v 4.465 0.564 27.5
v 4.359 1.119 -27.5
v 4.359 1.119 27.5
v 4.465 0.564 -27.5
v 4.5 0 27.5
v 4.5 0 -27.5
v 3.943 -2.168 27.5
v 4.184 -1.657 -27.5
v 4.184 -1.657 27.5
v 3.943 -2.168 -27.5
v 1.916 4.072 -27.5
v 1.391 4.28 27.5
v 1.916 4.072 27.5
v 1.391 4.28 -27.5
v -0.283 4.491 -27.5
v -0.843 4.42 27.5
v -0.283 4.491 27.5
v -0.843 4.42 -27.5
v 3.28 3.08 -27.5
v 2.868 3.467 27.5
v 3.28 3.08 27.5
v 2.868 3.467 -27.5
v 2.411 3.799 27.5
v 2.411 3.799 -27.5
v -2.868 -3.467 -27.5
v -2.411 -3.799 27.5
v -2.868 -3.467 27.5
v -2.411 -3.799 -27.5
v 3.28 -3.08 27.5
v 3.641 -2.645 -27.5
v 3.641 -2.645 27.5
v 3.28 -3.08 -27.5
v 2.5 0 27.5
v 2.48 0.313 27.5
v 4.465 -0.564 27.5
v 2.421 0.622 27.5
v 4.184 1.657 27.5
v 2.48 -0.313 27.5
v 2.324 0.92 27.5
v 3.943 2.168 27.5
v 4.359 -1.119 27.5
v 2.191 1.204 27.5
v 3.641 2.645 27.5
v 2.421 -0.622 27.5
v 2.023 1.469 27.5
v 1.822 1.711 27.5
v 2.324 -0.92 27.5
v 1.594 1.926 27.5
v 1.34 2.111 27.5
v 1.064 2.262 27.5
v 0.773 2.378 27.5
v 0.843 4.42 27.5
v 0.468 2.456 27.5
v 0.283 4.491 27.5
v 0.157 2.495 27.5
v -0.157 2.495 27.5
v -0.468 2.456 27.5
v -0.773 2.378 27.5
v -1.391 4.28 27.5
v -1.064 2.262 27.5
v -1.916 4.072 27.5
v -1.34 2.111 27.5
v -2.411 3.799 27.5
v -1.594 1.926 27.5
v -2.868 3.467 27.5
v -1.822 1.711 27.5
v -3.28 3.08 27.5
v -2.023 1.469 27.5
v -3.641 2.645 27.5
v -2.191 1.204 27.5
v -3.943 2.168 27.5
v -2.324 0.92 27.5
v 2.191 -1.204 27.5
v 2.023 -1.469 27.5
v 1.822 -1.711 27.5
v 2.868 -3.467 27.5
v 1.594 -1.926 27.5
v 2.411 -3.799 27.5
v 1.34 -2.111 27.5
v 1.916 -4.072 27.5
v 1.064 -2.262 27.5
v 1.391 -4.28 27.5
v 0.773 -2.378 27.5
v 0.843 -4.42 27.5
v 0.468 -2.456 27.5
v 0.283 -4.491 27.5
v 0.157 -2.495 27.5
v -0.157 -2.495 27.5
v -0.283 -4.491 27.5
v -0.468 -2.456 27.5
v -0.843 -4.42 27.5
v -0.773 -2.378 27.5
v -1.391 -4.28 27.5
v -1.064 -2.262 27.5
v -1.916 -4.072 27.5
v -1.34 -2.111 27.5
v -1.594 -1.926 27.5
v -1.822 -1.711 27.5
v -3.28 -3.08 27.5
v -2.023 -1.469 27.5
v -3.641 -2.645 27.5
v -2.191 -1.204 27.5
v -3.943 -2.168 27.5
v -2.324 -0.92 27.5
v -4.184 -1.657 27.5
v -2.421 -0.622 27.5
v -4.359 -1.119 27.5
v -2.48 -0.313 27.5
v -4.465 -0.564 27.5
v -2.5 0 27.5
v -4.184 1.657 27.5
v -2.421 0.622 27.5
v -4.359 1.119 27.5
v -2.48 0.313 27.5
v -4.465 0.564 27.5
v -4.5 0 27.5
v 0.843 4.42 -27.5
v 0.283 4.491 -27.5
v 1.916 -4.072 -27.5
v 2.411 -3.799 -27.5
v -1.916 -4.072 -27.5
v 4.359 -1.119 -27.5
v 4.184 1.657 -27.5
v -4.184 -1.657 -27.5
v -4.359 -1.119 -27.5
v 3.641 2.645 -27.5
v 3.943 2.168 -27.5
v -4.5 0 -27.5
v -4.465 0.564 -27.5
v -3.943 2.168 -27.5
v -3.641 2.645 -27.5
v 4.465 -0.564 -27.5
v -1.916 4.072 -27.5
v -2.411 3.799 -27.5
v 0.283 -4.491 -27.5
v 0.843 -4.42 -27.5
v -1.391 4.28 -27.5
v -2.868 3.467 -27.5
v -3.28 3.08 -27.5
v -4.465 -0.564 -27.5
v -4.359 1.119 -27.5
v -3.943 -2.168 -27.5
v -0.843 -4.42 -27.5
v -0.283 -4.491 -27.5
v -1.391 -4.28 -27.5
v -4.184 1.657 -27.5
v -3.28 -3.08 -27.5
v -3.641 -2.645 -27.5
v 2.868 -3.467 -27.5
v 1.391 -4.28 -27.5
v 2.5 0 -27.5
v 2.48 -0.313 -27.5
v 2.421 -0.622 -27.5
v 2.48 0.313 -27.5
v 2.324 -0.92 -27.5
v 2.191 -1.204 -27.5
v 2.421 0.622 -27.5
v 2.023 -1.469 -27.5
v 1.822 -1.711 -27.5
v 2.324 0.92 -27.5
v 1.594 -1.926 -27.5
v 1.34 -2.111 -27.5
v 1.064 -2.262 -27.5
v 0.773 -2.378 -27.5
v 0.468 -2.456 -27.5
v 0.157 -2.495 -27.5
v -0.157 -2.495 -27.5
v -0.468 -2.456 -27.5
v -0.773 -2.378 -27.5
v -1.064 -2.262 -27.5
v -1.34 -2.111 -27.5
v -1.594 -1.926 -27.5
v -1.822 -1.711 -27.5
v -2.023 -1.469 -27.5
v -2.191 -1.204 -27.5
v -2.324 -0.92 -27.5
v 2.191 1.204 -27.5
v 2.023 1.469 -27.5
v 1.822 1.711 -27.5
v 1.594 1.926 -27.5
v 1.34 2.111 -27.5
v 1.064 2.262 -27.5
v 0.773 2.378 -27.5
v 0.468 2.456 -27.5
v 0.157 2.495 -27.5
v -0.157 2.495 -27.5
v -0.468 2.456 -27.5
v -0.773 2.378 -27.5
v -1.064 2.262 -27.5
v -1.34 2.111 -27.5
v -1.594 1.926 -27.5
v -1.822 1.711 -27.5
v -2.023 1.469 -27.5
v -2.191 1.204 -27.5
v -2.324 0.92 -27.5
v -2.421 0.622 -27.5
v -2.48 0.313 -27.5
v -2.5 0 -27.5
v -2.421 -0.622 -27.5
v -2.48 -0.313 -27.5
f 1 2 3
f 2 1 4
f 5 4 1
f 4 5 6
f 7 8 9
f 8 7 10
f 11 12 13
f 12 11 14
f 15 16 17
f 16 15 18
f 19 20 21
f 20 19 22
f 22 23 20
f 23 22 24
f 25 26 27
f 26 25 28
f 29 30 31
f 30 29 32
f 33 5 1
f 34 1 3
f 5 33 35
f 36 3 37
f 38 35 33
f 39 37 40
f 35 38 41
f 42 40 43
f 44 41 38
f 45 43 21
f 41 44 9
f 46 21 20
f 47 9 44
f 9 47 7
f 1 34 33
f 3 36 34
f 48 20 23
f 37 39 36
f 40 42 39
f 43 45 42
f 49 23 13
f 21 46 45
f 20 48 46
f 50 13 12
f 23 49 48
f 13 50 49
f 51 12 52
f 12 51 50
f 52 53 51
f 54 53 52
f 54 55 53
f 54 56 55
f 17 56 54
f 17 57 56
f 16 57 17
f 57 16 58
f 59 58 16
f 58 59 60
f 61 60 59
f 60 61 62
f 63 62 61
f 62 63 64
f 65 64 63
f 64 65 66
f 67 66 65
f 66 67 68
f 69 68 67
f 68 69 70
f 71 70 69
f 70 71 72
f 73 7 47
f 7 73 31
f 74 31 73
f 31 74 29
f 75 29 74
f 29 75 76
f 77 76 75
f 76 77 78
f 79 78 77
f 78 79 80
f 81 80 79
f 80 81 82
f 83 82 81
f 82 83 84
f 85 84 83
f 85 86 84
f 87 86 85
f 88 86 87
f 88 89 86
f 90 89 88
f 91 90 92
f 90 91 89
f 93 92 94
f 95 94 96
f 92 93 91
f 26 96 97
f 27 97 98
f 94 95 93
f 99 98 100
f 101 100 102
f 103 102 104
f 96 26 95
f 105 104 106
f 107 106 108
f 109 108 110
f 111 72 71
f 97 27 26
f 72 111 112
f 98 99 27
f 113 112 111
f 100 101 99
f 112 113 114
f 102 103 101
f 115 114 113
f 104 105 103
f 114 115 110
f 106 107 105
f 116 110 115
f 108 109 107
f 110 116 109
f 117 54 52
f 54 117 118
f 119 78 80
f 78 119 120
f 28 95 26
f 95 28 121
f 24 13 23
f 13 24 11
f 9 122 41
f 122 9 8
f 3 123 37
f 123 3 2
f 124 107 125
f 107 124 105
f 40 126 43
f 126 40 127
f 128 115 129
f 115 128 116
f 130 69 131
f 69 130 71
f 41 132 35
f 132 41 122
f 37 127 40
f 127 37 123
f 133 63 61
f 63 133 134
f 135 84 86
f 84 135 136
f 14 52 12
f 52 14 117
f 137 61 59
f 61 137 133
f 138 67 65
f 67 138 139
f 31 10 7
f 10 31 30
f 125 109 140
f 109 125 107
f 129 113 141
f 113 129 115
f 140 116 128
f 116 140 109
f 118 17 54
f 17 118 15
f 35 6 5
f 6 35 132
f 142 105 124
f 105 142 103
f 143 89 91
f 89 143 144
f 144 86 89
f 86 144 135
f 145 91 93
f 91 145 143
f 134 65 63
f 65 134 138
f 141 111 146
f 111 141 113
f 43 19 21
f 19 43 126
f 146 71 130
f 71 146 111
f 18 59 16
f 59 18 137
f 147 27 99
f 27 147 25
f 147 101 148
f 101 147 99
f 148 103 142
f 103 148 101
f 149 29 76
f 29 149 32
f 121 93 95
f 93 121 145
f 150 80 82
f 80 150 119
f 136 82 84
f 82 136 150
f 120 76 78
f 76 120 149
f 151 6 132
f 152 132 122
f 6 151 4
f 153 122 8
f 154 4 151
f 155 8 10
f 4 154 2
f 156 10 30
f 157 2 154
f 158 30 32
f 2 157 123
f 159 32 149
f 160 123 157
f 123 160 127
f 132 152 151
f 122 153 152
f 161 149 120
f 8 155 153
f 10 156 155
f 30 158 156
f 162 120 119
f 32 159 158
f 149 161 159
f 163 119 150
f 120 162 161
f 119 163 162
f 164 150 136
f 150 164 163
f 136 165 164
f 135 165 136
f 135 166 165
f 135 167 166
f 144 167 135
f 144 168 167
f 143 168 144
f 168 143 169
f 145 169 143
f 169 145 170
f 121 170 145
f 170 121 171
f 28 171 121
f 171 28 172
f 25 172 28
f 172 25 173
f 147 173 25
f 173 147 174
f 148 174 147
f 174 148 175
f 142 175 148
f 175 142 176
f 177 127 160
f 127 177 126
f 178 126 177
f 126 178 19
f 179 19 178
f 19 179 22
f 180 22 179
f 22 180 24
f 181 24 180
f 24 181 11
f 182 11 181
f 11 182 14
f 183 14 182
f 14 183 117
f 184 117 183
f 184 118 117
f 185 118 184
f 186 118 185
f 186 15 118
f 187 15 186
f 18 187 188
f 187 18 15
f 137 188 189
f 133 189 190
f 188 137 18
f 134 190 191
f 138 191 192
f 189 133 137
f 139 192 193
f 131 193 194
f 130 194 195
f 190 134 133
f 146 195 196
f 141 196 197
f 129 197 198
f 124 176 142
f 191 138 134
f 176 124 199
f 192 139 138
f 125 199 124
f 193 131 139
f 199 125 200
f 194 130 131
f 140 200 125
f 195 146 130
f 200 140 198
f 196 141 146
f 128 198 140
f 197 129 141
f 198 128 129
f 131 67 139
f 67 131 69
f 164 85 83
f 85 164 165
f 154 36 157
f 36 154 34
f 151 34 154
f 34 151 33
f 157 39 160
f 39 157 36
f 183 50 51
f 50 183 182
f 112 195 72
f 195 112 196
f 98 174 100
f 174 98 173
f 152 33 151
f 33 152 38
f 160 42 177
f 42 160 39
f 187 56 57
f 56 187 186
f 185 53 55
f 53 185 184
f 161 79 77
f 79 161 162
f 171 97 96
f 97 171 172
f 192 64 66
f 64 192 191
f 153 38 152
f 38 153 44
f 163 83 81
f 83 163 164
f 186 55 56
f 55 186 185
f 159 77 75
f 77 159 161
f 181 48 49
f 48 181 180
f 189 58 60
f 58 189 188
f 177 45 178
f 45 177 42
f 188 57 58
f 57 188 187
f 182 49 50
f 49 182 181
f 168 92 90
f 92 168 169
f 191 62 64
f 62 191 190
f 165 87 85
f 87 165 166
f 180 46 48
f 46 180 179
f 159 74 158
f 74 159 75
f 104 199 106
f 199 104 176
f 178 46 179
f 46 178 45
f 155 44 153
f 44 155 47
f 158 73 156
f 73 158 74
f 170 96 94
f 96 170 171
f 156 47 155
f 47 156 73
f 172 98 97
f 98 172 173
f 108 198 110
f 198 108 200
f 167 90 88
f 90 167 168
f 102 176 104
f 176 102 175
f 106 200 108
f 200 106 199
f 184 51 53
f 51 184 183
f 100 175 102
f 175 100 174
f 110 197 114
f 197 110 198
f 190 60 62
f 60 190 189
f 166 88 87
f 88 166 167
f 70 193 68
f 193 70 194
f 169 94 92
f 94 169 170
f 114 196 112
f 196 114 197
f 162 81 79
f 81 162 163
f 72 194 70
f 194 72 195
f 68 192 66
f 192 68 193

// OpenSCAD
$fn = 50;


difference() {
	union() {
		translate(v = [0, 0, -27.5000000000]) {
			cylinder(h = 55, r = 4.5000000000);
		}
	}
	union() {
		translate(v = [0, 0, -100.0000000000]) {
			cylinder(h = 200, r = 2.5000000000);
		}
	}
}
